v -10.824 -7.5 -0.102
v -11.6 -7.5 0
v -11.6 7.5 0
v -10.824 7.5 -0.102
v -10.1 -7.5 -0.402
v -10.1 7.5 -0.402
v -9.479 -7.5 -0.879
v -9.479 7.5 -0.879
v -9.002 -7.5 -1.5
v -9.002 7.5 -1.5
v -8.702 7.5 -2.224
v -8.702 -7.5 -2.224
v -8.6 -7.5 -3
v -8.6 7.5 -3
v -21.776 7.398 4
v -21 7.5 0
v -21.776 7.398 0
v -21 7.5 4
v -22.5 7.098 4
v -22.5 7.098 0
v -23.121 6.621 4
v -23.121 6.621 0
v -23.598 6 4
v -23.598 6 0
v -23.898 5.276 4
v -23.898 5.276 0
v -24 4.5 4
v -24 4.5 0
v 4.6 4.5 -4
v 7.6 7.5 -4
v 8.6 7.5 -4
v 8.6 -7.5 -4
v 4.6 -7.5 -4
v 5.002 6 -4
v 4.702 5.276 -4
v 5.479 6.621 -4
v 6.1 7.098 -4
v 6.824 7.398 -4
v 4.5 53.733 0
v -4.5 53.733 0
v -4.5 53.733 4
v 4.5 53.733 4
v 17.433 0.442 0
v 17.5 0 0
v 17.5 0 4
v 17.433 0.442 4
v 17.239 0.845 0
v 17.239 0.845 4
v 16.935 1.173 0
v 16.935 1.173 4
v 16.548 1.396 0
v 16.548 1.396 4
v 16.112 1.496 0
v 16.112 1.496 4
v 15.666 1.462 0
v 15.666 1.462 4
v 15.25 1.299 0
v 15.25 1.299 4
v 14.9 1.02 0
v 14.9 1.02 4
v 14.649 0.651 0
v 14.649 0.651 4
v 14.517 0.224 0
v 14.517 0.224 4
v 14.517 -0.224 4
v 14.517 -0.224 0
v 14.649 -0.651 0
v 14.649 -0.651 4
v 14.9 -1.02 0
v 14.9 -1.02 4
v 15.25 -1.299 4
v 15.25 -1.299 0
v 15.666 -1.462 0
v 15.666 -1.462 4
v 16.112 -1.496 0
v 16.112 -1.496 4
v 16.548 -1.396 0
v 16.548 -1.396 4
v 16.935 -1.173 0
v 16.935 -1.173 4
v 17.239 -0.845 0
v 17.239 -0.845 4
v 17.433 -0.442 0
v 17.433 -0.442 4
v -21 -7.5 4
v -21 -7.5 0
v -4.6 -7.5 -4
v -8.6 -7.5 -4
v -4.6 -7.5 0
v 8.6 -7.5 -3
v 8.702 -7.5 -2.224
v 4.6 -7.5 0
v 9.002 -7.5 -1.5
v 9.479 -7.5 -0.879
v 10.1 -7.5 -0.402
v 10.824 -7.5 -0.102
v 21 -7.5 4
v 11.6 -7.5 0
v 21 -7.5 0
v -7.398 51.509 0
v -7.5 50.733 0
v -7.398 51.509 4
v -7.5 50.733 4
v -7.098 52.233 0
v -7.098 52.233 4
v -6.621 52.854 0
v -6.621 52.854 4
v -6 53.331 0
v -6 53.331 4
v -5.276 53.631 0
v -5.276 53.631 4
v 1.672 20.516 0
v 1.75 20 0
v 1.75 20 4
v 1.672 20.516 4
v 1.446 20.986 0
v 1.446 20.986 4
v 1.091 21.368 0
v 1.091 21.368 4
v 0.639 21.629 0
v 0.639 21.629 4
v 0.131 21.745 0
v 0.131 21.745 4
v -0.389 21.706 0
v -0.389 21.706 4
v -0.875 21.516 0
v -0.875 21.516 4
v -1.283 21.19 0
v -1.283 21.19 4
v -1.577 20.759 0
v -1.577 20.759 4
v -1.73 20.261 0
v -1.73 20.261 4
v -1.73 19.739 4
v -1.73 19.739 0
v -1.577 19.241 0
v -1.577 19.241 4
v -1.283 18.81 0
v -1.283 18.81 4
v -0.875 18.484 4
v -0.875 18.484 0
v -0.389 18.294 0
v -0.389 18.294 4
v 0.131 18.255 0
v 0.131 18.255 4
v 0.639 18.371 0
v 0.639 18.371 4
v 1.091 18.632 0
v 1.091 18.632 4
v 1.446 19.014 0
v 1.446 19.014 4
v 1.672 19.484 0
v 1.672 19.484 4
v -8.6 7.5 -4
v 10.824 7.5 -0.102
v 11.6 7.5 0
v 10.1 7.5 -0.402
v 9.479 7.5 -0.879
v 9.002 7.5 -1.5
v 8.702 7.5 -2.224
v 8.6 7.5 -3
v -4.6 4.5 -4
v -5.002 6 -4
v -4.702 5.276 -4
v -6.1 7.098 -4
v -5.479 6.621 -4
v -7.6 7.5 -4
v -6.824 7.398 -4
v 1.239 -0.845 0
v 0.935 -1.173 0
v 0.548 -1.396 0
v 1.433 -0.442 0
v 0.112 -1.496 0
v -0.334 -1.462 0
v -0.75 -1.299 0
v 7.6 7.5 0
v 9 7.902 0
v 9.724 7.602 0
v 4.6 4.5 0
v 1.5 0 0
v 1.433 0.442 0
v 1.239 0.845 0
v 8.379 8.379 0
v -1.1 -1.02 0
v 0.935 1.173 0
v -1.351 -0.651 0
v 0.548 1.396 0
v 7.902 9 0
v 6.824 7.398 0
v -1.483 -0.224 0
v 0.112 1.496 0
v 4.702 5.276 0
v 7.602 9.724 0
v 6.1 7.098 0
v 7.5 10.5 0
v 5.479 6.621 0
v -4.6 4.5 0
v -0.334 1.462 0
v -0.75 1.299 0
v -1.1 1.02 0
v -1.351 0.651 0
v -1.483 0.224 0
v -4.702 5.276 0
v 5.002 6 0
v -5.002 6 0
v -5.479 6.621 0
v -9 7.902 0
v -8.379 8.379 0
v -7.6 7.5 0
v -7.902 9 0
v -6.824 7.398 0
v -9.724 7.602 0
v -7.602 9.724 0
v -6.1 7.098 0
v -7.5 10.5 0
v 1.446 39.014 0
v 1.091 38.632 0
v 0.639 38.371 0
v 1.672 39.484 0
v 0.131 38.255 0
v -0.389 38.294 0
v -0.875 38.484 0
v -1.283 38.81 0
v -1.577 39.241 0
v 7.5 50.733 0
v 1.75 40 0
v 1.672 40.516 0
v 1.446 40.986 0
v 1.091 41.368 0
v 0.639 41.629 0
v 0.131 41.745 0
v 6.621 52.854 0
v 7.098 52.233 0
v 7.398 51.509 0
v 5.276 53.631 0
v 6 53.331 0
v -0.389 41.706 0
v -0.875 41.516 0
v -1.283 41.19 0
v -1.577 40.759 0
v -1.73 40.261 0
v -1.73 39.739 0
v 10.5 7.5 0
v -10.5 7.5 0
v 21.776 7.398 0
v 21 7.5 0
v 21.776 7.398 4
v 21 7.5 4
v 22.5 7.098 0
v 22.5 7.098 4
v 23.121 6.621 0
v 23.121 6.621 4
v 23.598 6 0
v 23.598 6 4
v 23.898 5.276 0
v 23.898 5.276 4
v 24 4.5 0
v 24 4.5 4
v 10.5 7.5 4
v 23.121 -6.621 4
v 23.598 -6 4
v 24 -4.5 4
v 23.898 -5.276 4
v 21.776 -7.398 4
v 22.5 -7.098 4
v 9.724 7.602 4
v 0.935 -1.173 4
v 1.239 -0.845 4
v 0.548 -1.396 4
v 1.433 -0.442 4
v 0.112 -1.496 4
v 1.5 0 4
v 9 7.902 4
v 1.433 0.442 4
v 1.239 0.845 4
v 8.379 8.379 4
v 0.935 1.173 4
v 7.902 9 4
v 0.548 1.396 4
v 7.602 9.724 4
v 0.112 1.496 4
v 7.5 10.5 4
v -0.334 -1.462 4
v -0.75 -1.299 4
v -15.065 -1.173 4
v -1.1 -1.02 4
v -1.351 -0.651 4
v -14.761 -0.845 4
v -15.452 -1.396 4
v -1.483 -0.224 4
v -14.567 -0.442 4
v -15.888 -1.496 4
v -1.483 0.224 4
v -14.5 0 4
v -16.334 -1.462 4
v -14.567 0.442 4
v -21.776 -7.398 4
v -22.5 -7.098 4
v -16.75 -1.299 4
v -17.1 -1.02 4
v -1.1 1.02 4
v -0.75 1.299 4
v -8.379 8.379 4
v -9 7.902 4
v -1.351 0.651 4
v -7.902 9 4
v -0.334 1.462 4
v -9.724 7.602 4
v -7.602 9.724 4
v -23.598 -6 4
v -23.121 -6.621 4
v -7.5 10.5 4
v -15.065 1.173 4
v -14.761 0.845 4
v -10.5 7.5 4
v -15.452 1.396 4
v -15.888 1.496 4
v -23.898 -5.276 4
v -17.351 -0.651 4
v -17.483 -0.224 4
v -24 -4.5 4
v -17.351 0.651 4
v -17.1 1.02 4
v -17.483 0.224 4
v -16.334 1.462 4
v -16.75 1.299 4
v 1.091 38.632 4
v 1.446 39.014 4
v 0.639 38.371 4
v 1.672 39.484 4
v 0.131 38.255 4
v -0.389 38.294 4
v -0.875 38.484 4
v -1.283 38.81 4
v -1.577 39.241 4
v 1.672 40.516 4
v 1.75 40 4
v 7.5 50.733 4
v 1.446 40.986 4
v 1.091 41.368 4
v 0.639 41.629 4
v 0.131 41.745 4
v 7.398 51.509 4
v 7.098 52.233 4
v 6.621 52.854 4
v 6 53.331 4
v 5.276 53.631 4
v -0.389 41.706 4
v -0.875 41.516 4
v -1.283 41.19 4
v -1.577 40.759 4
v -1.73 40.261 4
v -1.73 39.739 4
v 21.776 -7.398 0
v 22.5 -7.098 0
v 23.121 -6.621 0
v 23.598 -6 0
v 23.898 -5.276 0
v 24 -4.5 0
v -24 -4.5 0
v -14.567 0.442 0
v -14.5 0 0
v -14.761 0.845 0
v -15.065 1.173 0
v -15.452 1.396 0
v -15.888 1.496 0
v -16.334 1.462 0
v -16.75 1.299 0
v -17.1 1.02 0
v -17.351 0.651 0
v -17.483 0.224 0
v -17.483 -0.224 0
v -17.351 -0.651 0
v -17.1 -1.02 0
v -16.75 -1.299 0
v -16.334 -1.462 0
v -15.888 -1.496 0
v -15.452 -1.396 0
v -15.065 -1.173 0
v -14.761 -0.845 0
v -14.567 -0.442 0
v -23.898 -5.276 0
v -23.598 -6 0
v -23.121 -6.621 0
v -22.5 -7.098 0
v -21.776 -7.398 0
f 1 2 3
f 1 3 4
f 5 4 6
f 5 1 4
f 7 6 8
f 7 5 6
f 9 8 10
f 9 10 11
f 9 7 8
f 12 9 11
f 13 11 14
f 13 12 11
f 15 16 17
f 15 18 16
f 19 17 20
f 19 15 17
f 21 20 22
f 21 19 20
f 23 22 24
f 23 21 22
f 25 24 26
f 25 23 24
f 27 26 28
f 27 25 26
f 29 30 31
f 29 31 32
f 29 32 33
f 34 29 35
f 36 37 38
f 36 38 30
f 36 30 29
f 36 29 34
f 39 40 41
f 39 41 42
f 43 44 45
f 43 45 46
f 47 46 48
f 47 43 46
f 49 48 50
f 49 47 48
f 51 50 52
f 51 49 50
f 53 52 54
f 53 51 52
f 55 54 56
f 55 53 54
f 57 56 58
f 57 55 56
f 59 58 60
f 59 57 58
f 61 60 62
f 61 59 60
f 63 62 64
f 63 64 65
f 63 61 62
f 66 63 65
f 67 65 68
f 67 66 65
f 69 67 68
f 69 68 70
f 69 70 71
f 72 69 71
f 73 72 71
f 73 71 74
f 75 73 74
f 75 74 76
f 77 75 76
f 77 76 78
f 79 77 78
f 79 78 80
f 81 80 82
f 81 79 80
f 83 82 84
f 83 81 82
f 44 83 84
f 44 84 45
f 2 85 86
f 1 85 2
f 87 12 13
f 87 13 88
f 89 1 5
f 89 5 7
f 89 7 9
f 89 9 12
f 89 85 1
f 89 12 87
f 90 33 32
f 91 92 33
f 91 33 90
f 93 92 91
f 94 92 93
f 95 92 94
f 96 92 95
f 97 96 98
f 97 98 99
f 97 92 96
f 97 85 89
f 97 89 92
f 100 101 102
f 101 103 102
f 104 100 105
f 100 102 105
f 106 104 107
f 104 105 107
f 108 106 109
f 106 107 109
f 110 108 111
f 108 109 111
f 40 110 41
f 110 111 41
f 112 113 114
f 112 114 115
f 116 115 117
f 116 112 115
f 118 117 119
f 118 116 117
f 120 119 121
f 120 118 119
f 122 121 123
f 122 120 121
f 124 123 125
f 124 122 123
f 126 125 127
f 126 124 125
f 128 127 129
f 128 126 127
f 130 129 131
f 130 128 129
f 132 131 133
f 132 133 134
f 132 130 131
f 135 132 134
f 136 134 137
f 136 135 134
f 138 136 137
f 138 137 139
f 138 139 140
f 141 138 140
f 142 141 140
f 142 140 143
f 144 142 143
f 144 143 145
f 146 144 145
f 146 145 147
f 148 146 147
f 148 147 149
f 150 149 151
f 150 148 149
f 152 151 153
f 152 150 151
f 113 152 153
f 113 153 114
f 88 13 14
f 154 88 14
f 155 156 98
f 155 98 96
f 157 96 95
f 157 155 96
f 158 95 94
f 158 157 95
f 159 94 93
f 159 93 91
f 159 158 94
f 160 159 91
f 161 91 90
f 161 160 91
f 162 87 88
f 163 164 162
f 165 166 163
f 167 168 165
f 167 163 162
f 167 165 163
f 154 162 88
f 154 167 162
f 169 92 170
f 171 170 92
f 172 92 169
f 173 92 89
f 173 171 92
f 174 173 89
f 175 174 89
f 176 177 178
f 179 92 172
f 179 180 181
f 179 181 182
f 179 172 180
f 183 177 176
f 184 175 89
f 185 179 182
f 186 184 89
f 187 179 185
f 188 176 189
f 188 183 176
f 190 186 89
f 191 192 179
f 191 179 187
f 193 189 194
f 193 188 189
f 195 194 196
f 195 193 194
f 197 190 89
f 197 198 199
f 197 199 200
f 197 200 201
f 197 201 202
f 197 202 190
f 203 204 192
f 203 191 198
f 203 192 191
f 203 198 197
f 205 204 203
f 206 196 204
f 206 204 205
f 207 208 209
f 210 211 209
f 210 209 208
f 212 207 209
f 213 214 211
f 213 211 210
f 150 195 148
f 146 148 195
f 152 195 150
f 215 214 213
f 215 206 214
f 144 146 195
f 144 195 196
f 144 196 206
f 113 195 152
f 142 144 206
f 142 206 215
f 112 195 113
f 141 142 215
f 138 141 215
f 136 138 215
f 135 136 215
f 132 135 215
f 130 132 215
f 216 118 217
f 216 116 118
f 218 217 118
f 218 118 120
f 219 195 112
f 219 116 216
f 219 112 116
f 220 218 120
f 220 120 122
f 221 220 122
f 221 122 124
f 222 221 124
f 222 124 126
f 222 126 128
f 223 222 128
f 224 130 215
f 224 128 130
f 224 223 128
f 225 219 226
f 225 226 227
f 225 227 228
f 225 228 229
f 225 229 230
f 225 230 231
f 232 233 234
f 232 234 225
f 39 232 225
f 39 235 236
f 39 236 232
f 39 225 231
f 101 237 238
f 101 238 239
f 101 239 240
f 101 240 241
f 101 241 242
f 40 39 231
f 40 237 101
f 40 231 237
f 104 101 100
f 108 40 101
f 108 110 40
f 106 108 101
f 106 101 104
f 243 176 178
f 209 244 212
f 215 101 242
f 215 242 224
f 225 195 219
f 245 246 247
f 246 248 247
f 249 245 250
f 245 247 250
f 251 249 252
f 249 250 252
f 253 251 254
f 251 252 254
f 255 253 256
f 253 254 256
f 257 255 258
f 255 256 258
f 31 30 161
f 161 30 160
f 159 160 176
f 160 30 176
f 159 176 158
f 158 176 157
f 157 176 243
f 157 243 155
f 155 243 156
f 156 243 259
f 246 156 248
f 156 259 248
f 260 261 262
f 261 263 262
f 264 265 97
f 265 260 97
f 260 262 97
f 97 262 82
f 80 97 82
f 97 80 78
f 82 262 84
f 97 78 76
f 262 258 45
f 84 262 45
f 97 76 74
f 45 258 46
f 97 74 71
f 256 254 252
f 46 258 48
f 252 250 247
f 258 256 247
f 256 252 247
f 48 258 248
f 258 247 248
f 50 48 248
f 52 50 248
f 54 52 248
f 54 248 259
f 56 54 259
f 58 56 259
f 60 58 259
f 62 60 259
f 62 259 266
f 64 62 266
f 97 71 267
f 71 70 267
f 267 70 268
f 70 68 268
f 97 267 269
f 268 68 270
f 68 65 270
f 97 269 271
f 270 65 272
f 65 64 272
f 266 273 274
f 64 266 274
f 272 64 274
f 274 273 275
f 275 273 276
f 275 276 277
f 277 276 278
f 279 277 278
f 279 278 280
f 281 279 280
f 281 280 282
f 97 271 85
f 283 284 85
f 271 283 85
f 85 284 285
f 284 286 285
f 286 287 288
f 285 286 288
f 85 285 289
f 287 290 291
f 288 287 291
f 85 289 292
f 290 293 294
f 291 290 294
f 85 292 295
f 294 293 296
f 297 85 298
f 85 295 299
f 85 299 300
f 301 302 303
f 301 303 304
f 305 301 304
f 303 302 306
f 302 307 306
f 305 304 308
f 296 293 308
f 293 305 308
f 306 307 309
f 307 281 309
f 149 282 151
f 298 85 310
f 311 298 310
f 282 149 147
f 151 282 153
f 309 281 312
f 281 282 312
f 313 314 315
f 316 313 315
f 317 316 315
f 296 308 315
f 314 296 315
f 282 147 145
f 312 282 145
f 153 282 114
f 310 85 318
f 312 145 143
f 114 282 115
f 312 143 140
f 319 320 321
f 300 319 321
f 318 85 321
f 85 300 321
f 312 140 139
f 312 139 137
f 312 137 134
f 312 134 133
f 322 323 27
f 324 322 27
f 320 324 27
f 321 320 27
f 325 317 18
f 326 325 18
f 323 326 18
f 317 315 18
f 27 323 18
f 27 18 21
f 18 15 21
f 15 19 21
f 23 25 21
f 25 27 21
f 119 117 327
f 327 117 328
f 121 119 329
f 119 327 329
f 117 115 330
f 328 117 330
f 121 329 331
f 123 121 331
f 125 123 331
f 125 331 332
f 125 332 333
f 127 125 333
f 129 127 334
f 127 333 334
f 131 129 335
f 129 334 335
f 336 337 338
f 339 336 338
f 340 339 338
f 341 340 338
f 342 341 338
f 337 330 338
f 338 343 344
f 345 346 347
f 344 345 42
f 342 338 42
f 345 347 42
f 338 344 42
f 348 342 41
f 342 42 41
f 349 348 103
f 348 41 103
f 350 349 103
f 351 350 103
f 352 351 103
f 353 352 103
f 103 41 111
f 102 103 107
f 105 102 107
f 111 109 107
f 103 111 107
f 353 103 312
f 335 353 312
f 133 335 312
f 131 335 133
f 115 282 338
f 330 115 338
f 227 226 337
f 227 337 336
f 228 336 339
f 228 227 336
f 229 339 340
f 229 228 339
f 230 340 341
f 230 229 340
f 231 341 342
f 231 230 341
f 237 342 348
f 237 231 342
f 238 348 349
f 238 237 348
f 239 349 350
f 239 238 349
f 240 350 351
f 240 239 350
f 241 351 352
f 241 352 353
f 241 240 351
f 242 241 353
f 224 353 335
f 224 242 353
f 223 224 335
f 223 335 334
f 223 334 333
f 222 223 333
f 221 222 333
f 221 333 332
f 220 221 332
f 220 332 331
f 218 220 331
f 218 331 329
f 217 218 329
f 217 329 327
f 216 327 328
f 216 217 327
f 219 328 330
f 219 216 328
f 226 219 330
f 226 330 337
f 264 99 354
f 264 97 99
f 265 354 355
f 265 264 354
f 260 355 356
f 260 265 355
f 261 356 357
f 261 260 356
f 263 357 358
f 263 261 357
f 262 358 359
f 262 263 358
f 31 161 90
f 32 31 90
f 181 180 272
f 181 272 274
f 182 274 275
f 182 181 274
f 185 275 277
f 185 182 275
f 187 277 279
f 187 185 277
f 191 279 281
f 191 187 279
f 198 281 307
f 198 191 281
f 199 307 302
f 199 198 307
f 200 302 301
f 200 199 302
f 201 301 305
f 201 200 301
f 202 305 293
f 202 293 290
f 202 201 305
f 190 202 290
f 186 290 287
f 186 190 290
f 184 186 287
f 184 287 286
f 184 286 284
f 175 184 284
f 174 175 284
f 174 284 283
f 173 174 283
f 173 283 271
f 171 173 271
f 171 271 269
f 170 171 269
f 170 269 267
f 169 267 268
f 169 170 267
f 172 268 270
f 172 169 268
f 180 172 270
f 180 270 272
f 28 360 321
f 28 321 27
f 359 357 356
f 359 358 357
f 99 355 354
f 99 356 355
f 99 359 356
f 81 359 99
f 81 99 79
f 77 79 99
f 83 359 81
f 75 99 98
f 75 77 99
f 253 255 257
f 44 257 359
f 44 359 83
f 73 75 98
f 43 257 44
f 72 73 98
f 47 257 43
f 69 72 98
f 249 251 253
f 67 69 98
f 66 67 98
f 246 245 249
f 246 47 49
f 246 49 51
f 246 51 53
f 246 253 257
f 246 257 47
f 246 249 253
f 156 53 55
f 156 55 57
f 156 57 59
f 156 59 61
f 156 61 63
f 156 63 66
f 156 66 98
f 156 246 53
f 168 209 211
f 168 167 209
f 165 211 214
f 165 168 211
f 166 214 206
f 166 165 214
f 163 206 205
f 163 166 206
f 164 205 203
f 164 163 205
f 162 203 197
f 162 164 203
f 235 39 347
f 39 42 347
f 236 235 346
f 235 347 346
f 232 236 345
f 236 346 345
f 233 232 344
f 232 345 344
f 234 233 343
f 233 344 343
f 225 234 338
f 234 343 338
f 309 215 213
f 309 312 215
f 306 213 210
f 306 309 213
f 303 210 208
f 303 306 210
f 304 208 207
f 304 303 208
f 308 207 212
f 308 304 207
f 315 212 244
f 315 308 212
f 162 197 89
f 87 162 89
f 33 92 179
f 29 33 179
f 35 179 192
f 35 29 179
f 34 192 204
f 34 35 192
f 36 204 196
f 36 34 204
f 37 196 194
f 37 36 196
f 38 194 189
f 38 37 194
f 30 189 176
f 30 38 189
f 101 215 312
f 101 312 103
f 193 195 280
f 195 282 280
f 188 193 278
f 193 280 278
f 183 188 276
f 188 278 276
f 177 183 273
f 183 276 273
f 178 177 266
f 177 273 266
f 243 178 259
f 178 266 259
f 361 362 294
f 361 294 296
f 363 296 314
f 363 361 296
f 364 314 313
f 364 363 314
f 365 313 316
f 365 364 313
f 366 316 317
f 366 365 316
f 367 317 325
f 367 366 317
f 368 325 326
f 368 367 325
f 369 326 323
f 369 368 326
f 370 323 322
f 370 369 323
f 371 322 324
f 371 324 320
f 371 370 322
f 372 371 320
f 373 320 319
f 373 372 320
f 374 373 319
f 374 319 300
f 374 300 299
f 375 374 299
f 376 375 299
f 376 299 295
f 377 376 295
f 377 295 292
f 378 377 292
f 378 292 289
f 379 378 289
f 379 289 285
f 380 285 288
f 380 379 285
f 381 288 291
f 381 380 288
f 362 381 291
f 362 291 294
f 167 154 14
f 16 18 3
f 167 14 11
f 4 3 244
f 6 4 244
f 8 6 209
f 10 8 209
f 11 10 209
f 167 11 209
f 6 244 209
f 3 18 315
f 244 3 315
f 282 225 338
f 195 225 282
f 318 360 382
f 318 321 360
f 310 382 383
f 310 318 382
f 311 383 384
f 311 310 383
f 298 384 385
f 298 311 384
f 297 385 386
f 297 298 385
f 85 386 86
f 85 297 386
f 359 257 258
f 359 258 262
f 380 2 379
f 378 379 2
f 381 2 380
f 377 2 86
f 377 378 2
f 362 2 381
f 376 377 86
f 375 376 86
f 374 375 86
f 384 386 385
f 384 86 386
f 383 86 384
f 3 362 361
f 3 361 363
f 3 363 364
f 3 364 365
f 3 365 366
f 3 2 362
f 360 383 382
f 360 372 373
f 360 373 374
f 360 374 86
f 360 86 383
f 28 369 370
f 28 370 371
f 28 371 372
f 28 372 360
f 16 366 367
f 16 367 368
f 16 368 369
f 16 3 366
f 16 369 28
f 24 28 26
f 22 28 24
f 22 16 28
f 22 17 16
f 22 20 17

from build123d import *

# Parameters (mm, degrees)
SKETCH_1_R      = 1.75
SKETCH_1_R_2    = 1.5
EXTRUDE_1_DEPTH = 4
FILLET_1_R      = 3
EXTRUDE_2_DEPTH = 4
FILLET_2_R      = 3
FILLET_3_R      = 3


with BuildPart() as part:
    # 草图1 → 凸台-拉伸1 (new body)
    with BuildSketch(Plane.XY):
        Polygon((-7.5, 7.5), (-7.5, 53.732798972), (7.5, 53.732798972), (7.5, 7.5), (24, 7.5), (24, -7.5), (-24, -7.5), (-24, 7.5), align=None)
        with Locations((0, 40)):
            Circle(SKETCH_1_R, mode=Mode.SUBTRACT)
        with Locations((0, 20)):
            Circle(SKETCH_1_R, mode=Mode.SUBTRACT)
        with Locations((16, 0)):
            Circle(SKETCH_1_R_2, mode=Mode.SUBTRACT)
        Circle(SKETCH_1_R_2, mode=Mode.SUBTRACT)
        with Locations((-16, 0)):
            Circle(SKETCH_1_R_2, mode=Mode.SUBTRACT)
    extrude(amount=EXTRUDE_1_DEPTH)

    # 圆角1
    fillet_1_edges = [part.edges().sort_by_distance(p)[0] for p in [
        (-7.5, 53.732798972, 2),
        (7.5, 53.732798972, 2),
        (7.5, 7.5, 2),
        (24, 7.5, 2),
        (24, -7.5, 2),
        (-24, -7.5, 2),
        (-24, 7.5, 2),
        (-7.5, 7.5, 2),
    ]]
    fillet(fillet_1_edges, radius=FILLET_1_R)

    # 草图2 → 凸台-拉伸2 (add)
    with BuildSketch(Plane(origin=(0, 0, 0), x_dir=(-1, 0, 0), z_dir=(0, 0, -1))):
        Polygon((4.6, -4.836204333), (4.6, -7.5), (8.6, -7.5), (8.6, 7.5), (4.6, 7.5), align=None)
        Polygon((-4.6, -4.836204333), (-4.6, 7.5), (-8.6, 7.5), (-8.6, -7.5), (-4.6, -7.5), align=None)
    extrude(amount=EXTRUDE_2_DEPTH)

    # 圆角2
    # the kernel refuses this fillet: 3 mm, written as the material it adds along each edge
    with BuildSketch(Plane(origin=(-8.6, -7.5, 0), x_dir=(-1, 0, 0), z_dir=(0, 1, 0)), Plane(origin=(8.6, 7.5, 0), x_dir=(1, 0, 0), z_dir=(0, -1, 0))) as fillet_2_piece_1:
        with BuildLine():
            CenterArc((FILLET_2_R, -FILLET_2_R), FILLET_2_R, 90, 90)
            Line((0, -FILLET_2_R), (0, 0))
            Line((0, 0), (FILLET_2_R, 0))
        make_face()
    extrude(amount=15)

    # 圆角3
    fillet_3_edges = [part.edges().sort_by_distance(p)[0] for p in [
        (-4.6, 7.5, -2),
        (4.6, 7.5, -2),
    ]]
    fillet(fillet_3_edges, radius=FILLET_3_R)


solid = part.part
